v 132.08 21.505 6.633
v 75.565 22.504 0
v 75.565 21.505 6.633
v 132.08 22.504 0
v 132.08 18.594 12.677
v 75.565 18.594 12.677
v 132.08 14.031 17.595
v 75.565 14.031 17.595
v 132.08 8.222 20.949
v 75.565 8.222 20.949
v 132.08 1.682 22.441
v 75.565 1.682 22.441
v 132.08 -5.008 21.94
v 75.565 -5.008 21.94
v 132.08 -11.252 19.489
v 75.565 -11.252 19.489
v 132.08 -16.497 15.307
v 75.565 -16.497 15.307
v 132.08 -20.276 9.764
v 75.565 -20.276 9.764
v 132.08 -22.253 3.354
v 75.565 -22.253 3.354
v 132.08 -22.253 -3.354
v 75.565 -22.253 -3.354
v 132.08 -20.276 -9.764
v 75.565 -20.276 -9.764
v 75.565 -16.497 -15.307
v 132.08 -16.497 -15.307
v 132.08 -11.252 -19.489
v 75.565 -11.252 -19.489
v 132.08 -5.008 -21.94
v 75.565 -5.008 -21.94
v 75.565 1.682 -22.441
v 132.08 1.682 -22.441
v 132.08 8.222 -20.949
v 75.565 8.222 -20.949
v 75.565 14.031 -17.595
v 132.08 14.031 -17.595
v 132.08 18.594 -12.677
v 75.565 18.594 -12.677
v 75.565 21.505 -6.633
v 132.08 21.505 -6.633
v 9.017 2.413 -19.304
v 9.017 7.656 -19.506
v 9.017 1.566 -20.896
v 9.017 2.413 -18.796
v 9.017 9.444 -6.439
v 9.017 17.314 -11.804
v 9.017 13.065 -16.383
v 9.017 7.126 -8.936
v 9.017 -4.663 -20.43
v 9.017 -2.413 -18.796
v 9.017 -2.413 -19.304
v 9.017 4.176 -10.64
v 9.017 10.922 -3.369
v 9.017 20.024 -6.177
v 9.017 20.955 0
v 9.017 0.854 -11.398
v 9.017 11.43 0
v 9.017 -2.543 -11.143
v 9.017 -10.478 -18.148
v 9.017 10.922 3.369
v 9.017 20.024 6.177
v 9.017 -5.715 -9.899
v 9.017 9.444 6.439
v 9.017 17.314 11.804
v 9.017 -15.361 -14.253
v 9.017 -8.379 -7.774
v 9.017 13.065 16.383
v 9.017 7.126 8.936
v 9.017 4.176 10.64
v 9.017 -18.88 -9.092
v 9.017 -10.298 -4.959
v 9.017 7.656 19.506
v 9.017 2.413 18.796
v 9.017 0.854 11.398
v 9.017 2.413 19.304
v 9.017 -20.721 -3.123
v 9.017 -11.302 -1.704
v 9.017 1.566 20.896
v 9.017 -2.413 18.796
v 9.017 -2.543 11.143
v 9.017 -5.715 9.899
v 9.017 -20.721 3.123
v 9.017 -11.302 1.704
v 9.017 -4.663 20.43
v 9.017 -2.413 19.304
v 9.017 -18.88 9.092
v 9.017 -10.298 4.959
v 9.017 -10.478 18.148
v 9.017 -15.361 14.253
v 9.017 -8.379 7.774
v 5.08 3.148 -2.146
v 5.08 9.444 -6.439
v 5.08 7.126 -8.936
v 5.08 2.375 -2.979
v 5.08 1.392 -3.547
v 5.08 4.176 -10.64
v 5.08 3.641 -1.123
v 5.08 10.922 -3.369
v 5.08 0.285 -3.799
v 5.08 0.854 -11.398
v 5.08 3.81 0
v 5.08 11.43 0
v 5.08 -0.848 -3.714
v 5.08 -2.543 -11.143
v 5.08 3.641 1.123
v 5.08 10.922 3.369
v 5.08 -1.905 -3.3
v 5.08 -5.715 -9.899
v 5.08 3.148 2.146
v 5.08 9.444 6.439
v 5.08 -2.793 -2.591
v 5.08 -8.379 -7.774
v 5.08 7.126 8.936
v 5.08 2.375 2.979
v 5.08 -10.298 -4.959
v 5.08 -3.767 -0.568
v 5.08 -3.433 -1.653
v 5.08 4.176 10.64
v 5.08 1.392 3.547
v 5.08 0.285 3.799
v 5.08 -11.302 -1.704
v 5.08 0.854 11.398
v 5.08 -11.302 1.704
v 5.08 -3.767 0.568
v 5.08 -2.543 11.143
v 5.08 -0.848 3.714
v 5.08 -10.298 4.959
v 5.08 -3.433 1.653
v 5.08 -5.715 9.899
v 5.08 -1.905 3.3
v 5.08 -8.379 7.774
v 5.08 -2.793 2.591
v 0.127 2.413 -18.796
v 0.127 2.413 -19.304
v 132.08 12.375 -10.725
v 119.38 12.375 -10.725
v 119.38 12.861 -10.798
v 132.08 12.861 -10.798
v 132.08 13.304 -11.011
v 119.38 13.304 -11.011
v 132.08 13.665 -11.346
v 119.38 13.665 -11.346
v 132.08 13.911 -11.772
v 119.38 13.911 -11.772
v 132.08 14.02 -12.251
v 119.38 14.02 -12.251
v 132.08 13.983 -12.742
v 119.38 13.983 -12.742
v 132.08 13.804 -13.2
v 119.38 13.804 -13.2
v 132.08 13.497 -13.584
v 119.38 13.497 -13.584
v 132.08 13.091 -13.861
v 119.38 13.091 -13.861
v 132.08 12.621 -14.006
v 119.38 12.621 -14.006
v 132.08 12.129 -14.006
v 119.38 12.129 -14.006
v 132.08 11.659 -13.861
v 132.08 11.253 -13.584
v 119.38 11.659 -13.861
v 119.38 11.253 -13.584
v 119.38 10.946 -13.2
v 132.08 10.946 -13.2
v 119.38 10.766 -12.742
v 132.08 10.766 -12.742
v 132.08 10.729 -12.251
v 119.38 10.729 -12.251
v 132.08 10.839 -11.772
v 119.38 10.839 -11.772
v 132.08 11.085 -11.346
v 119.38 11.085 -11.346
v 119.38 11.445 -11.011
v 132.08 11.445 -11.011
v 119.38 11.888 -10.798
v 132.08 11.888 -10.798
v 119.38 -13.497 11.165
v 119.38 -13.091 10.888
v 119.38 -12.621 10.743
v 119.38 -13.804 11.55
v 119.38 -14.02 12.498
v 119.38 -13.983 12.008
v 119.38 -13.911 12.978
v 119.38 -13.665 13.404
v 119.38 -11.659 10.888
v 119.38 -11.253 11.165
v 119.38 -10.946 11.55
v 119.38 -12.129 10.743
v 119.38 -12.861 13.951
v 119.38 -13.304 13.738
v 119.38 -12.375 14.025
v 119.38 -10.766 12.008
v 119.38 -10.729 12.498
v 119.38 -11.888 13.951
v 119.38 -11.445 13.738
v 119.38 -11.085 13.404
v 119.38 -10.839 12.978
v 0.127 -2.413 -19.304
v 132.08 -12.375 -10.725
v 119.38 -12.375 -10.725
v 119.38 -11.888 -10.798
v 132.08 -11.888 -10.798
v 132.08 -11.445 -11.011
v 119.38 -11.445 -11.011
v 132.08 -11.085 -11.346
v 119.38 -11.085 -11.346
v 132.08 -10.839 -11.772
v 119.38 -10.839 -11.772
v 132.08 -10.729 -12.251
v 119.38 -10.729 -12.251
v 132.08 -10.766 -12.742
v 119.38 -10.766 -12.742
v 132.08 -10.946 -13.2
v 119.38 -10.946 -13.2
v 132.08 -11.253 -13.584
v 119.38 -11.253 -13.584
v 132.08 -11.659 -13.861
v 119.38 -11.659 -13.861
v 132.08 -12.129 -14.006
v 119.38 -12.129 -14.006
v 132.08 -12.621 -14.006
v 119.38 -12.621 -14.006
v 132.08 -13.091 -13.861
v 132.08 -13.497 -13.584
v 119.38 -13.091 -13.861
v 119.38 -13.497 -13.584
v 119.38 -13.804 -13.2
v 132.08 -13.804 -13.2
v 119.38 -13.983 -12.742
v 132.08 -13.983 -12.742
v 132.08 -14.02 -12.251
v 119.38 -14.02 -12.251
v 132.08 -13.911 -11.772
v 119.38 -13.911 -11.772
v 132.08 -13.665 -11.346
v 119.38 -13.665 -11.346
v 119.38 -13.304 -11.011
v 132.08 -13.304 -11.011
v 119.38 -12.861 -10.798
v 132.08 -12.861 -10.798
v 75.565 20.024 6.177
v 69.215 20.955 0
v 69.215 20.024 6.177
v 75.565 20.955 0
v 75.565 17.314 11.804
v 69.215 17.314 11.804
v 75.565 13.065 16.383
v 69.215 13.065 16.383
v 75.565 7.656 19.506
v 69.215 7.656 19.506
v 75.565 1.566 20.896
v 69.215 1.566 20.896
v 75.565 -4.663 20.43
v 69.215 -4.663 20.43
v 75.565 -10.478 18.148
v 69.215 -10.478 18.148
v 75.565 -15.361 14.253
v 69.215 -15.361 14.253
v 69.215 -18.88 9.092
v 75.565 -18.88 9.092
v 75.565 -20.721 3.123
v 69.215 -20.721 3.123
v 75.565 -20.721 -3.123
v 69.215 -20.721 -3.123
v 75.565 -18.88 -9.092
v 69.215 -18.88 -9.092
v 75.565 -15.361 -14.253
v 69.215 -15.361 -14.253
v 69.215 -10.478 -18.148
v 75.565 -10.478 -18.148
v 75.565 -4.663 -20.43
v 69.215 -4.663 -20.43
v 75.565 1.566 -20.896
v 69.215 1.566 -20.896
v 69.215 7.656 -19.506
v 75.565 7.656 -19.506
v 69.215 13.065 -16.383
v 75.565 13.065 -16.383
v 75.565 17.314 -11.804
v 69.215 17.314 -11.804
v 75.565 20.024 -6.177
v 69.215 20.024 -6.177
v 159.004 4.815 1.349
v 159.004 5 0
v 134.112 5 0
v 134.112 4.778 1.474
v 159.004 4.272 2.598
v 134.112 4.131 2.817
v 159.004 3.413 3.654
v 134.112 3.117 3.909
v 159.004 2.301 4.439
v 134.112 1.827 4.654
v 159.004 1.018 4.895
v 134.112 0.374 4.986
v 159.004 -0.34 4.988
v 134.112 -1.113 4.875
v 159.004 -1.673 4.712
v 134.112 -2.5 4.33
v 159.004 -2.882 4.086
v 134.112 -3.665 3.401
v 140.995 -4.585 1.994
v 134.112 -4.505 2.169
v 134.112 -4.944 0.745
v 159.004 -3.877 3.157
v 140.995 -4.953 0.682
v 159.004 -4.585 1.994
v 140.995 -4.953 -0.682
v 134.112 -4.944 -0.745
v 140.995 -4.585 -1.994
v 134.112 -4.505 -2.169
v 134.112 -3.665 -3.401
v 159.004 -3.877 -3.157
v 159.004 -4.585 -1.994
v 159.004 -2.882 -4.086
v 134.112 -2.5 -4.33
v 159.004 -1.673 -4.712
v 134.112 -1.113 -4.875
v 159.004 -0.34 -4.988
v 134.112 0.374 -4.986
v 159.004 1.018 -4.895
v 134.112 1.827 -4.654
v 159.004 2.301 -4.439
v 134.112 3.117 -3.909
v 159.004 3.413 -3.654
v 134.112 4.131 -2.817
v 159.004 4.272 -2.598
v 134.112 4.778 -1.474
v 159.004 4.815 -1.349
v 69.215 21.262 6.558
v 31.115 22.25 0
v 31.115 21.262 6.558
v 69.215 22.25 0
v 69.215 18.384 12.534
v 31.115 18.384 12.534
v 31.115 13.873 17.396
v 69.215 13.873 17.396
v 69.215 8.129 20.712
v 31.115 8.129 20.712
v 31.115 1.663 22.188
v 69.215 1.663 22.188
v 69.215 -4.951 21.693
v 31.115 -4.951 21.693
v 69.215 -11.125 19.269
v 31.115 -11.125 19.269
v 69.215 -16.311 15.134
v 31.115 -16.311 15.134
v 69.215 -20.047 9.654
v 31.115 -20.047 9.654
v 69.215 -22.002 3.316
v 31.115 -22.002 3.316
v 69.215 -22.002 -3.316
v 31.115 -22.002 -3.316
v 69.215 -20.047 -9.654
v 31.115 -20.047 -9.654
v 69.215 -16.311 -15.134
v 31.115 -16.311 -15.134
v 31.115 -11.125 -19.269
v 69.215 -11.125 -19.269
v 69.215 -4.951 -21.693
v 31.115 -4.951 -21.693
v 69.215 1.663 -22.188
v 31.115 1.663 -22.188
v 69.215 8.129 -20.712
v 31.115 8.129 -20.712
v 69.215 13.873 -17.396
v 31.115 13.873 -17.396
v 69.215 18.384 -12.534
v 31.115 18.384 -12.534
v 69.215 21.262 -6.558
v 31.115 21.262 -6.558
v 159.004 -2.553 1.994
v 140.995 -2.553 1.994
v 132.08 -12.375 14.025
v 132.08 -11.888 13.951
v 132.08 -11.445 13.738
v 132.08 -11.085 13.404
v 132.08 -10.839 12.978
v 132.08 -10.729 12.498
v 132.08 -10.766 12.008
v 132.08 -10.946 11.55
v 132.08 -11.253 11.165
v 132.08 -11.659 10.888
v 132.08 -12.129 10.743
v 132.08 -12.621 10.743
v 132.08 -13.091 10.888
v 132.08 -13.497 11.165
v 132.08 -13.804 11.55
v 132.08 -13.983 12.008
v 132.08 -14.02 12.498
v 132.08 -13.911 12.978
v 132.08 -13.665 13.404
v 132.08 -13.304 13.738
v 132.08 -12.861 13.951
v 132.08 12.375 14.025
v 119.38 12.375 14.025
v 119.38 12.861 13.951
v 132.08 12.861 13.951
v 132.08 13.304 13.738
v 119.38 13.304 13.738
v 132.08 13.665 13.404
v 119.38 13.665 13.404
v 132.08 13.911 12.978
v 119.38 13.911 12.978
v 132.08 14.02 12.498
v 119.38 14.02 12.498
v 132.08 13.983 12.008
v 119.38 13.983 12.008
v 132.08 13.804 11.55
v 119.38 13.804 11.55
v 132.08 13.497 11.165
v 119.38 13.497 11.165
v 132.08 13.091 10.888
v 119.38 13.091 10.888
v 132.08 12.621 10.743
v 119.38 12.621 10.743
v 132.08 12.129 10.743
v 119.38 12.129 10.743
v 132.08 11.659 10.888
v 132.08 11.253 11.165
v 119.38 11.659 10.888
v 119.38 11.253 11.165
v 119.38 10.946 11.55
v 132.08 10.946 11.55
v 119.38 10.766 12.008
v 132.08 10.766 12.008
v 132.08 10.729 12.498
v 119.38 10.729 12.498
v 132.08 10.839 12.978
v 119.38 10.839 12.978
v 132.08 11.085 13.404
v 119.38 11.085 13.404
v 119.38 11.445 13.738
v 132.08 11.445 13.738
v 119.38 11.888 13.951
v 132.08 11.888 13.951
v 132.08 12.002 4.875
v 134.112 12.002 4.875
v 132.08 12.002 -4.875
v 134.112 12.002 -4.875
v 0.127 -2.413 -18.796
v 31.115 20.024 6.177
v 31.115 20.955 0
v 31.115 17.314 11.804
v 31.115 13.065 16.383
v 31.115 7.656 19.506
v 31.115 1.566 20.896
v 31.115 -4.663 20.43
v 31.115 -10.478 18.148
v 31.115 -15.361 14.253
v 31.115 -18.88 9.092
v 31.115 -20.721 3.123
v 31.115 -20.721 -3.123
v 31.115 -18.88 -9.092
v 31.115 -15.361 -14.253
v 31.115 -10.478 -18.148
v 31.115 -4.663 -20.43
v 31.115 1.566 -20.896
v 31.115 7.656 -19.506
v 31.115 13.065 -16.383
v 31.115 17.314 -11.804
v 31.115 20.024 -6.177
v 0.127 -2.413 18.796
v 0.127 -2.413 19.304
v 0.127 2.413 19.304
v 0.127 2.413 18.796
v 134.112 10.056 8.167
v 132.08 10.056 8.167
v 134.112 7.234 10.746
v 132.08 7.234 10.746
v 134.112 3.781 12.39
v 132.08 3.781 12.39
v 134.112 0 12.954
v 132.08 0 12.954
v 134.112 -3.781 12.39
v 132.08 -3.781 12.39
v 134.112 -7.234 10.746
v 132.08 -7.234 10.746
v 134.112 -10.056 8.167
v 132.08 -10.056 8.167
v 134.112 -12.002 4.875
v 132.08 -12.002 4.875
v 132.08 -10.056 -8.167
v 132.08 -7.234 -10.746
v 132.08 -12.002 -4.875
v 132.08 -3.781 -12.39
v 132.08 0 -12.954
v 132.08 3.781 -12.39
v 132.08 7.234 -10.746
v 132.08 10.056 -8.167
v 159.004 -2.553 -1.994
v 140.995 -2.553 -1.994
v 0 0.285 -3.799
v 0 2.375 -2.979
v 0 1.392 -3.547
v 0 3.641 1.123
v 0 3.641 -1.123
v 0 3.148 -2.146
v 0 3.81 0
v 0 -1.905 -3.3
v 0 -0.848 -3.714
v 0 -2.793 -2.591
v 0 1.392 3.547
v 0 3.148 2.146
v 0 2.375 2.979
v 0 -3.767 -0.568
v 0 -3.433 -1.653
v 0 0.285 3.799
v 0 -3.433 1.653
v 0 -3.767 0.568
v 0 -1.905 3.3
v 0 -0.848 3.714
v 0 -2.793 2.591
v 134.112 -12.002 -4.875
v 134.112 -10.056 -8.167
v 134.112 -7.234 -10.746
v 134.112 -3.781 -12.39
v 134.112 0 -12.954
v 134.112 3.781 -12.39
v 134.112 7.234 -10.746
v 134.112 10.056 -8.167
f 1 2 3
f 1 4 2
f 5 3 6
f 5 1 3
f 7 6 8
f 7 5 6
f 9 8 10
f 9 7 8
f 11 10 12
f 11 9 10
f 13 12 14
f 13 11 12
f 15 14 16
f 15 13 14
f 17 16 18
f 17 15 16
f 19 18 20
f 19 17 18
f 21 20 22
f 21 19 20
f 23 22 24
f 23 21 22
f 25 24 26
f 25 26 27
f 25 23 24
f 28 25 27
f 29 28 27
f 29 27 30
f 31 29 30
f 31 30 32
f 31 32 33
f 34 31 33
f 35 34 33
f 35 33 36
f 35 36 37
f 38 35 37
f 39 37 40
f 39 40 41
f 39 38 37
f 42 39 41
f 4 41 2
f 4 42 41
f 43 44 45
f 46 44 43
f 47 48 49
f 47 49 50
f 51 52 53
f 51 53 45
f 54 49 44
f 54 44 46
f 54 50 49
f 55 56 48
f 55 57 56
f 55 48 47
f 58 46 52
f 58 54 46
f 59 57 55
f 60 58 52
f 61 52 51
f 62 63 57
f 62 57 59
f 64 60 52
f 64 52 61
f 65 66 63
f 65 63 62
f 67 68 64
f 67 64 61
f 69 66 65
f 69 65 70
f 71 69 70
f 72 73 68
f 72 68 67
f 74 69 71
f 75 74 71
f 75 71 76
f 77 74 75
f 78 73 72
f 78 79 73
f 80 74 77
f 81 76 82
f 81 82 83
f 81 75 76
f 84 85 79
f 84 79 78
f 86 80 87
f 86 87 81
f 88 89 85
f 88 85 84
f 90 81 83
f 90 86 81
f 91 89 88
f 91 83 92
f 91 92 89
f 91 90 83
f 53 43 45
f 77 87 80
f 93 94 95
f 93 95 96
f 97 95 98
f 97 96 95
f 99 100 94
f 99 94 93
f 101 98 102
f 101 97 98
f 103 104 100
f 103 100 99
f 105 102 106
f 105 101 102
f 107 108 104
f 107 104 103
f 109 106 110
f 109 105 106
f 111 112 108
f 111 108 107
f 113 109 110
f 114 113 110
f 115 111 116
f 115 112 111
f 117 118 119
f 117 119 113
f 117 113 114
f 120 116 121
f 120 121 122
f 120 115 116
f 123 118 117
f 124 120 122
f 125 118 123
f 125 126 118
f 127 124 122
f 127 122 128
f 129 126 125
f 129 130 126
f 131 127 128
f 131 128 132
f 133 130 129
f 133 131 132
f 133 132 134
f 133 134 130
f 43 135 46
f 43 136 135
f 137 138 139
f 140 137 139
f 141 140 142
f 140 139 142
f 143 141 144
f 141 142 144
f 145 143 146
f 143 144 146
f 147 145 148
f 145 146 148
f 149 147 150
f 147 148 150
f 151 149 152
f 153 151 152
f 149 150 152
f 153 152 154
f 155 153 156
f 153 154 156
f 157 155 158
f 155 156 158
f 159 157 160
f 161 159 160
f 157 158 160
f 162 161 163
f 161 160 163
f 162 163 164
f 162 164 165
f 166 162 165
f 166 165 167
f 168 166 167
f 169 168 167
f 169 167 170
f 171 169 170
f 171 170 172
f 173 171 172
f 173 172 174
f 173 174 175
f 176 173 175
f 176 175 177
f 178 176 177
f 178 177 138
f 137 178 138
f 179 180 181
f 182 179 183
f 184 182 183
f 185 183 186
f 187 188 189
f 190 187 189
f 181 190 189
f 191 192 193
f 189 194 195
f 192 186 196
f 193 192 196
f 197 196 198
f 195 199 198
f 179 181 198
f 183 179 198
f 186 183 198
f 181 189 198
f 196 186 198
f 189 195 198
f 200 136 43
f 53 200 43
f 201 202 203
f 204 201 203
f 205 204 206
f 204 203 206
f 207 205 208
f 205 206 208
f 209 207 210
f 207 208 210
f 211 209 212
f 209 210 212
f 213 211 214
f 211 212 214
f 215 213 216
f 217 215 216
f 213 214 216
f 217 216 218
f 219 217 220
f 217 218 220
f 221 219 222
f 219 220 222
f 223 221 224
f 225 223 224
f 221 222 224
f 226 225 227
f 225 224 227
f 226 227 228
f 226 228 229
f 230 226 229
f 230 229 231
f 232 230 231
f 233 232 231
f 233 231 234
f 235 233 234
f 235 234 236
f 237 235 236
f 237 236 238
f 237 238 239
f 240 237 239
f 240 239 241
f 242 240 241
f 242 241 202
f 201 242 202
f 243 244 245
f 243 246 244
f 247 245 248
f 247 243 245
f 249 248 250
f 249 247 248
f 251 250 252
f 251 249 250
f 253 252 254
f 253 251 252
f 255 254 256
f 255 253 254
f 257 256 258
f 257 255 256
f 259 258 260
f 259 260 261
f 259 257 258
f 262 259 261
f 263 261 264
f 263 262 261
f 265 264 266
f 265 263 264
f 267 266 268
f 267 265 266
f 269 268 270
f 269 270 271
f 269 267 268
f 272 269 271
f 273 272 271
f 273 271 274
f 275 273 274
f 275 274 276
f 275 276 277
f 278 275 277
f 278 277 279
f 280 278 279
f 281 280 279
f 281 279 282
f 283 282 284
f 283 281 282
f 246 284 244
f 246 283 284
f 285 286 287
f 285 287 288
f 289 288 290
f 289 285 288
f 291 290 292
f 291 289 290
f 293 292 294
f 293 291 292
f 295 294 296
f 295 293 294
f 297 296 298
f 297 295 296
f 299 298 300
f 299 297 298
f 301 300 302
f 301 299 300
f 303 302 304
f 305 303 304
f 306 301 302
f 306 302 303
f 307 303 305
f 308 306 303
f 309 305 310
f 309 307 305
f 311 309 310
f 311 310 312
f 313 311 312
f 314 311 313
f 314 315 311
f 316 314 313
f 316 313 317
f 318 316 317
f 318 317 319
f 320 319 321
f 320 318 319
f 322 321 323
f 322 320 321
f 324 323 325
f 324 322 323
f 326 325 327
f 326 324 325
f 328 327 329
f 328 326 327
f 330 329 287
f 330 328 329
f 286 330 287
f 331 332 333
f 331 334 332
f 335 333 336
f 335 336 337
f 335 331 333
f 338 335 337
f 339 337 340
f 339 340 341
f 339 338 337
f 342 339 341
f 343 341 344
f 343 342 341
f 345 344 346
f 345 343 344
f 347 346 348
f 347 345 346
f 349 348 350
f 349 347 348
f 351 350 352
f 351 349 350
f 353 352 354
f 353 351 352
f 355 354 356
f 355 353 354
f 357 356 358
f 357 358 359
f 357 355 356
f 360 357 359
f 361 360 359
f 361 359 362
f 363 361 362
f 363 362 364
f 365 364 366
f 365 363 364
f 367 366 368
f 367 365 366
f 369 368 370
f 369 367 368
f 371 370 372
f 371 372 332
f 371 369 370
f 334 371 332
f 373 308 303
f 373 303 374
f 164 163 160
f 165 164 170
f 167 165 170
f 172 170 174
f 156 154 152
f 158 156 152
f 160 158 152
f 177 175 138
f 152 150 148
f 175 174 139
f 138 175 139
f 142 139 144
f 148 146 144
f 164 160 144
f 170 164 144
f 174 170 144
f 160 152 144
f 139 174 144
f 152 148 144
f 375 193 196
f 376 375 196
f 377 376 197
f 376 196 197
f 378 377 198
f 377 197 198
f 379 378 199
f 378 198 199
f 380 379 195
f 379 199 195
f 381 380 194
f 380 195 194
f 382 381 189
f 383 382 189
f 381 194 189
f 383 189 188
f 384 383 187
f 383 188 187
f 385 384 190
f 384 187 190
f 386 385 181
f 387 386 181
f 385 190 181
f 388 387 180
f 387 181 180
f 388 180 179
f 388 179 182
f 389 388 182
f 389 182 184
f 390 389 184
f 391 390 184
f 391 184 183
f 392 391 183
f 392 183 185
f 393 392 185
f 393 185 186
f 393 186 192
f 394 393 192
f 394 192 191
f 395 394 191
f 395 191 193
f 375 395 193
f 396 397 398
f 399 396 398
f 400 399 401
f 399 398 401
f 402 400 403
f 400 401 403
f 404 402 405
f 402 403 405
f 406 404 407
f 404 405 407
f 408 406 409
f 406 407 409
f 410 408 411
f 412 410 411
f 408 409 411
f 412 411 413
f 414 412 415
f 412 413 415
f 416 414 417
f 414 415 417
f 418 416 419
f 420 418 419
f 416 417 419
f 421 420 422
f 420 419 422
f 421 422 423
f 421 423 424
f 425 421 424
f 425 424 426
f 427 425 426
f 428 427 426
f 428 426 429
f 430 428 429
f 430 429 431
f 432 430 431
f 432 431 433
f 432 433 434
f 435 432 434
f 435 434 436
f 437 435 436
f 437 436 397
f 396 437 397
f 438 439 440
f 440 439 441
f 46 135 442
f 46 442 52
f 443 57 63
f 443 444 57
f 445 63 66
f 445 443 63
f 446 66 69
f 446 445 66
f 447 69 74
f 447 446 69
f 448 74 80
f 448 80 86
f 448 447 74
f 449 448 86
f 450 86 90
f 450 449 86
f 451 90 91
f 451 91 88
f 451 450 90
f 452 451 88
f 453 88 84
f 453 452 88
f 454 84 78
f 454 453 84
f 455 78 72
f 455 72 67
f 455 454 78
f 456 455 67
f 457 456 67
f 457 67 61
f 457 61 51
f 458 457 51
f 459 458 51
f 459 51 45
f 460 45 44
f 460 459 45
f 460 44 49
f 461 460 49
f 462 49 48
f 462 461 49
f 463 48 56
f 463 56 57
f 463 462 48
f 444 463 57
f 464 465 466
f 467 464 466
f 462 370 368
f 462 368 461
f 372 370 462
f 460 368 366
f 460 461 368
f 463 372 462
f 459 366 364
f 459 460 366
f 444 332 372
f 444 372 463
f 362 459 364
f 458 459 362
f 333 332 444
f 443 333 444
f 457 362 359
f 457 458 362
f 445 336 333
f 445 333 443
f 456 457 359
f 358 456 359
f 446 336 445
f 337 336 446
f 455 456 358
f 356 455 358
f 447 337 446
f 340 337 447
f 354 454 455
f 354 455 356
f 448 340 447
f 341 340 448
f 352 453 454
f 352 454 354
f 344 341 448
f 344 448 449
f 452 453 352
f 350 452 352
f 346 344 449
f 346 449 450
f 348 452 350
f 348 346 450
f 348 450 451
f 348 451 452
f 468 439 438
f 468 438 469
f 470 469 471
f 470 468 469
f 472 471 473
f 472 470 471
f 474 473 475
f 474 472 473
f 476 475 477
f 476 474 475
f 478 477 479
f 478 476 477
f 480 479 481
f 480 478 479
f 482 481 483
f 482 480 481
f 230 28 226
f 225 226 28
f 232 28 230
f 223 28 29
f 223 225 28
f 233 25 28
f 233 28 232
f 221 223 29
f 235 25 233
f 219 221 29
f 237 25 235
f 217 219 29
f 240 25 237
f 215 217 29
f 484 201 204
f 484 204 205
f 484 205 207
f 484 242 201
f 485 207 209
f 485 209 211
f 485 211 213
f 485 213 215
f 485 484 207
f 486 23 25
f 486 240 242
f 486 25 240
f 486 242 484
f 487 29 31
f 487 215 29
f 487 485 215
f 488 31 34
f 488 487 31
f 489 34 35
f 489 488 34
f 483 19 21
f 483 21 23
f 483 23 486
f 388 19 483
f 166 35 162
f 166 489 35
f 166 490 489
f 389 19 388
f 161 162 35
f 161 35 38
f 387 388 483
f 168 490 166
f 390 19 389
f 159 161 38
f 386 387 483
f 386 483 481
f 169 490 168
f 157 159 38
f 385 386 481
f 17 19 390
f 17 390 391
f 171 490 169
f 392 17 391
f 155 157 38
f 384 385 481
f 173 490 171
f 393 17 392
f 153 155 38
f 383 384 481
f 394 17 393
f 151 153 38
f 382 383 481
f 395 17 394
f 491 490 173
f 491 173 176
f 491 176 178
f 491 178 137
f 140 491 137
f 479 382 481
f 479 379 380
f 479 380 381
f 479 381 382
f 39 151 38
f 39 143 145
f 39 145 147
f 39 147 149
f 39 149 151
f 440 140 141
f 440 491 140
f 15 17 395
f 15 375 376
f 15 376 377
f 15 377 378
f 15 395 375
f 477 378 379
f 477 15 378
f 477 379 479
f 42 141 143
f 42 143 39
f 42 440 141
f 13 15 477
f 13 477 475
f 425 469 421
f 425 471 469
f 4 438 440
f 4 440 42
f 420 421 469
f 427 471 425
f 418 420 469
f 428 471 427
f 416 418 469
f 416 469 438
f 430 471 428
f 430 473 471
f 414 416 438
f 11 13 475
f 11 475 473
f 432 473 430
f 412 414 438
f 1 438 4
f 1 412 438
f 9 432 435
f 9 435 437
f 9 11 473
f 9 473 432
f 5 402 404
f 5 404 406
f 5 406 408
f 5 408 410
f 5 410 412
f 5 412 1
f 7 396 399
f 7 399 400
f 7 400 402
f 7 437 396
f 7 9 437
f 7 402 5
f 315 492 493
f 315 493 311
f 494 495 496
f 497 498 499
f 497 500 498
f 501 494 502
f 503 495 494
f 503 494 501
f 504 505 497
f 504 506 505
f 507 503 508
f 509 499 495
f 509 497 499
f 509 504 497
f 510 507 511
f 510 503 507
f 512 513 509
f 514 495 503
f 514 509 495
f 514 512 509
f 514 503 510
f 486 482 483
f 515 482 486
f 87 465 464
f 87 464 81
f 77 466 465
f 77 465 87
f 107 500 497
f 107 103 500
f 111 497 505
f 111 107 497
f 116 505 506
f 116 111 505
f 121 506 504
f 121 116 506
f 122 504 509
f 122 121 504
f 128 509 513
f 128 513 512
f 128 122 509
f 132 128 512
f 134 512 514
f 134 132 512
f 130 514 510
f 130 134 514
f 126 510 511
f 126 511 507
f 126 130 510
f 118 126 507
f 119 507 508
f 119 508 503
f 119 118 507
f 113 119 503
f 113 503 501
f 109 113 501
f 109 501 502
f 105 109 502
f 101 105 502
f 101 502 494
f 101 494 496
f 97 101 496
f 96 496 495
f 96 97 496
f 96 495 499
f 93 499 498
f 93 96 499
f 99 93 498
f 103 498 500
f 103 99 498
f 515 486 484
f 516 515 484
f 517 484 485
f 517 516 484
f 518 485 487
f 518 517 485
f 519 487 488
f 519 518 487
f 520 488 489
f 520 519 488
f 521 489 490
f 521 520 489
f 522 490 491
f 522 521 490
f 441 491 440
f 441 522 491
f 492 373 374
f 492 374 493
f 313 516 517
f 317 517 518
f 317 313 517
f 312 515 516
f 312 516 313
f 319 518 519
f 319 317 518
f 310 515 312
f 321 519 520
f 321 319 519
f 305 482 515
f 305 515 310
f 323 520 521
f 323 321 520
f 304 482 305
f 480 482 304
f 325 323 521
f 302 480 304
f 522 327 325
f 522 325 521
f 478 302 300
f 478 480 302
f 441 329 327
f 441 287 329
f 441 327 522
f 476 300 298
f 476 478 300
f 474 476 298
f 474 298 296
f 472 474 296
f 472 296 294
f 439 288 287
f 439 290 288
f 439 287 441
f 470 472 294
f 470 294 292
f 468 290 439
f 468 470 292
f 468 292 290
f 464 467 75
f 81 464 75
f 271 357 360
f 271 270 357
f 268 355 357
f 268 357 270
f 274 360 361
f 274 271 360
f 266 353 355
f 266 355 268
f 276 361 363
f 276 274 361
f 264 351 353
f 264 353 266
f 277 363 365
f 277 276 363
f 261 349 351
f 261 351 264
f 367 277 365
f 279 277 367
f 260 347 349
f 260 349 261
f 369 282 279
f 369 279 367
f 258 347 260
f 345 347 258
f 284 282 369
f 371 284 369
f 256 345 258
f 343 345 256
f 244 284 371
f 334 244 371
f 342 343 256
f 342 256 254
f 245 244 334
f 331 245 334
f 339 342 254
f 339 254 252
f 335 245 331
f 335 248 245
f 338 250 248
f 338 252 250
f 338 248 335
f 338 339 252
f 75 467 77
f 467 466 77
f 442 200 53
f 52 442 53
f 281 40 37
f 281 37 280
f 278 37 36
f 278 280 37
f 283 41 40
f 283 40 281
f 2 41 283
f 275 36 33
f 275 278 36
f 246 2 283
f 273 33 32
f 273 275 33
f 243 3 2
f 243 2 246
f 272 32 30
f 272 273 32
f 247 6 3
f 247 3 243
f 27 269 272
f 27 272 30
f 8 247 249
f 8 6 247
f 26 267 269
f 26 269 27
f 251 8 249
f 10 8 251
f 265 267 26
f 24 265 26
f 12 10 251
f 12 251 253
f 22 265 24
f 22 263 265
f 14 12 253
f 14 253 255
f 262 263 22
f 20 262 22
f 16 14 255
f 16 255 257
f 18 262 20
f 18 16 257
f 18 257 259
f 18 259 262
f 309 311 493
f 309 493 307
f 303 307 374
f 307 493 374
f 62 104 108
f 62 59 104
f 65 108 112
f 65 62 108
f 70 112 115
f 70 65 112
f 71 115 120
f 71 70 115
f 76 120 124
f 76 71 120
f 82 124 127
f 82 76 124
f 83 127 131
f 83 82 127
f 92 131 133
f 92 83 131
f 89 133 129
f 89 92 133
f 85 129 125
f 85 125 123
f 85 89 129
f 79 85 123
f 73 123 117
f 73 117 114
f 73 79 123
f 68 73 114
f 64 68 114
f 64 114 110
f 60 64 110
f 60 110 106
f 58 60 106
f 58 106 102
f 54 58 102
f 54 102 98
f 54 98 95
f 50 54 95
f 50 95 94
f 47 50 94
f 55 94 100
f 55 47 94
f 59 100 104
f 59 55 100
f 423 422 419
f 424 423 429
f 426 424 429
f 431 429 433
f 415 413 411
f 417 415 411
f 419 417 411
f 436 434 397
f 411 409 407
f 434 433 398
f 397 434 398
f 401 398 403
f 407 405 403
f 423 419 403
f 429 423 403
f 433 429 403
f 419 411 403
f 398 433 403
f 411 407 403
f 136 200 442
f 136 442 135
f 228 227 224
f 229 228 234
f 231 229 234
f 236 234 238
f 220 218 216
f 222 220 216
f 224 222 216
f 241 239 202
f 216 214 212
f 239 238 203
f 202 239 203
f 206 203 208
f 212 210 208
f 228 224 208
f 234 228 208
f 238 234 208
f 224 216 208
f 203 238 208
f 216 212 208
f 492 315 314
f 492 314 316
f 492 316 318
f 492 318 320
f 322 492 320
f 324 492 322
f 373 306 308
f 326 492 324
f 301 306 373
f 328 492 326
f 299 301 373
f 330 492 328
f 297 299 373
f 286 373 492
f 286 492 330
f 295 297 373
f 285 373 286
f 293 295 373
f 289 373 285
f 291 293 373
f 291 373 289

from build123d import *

# Parameters (mm, degrees)
CUT_EXTRUDE1_DEPTH              = 18.0086
CUT_EXTRUDE2_DEPTH              = 2.032
TAP_DRILL_FOR_M4X0_7_TAP2_D     = 3.3
TAP_DRILL_FOR_M4X0_7_TAP2_DEPTH = 12.7
SKETCH8_W                       = 8.89
SKETCH8_H                       = 4.826
BOSS_EXTRUDE1_DEPTH             = 0.254


with BuildPart() as part:
    # Sketch1 → Revolve1 (revolve)
    with BuildSketch(Plane.XY):
        Polygon((0, 0), (0, 3.81), (5.08, 3.81), (5.08, 11.43), (9.017, 11.43), (9.017, 20.955), (31.115, 20.955), (31.115, 22.2504), (69.215, 22.2504), (69.215, 20.955), (75.565, 20.955), (75.565, 22.5044), (132.08, 22.5044), (132.08, 12.954), (134.112, 12.954), (134.112, 4.99999), (159.004, 4.99999), (159.004, 0), align=None)
    revolve(axis=Axis((0, 0, 0), (1, 0, 0)))

    # Sketch2 → Cut-Extrude1 (cut)
    with BuildSketch(Plane(origin=(159.004, 0, 0), x_dir=(0, 0, -1), z_dir=(1, 0, 0))):
        with BuildLine():
            Line((-1.9939, -4.585222218), (-1.9939, -2.553222218))
            Line((-1.9939, -2.553222218), (1.9939, -2.553222218))
            Line((1.9939, -2.553222218), (1.9939, -4.585222218))
            ThreePointArc((1.9939, -4.585222218), (0, -4.99999), (-1.9939, -4.585222218))
        make_face()
    extrude(amount=-CUT_EXTRUDE1_DEPTH, mode=Mode.SUBTRACT)

    # Sketch3 → Cut-Extrude2 (cut)
    with BuildSketch(Plane(origin=(134.112, 0, 0), x_dir=(0, 0, -1), z_dir=(1, 0, 0))):
        with BuildLine():
            Line((-4.875460363, 12.0015), (4.875460363, 12.0015))
            ThreePointArc((4.875460363, 12.0015), (0, 12.954), (-4.875460363, 12.0015))
        make_face()
        with BuildLine():
            Line((-4.875460363, -12.0015), (4.875460363, -12.0015))
            ThreePointArc((4.875460363, -12.0015), (0, -12.954), (-4.875460363, -12.0015))
        make_face()
    extrude(amount=-CUT_EXTRUDE2_DEPTH, mode=Mode.SUBTRACT)

    # Tap Drill for M4x0.7 Tap2
    with Locations(Plane(origin=(132.08, 0, 0), x_dir=(0, 0, -1), z_dir=(1, 0, 0))):
        with Locations((-12.374792935, 12.374792935), (12.374792935, -12.374792935), (12.374792935, 12.374792935), (-12.374792935, -12.374792935)):
            Hole(TAP_DRILL_FOR_M4X0_7_TAP2_D / 2, depth=TAP_DRILL_FOR_M4X0_7_TAP2_DEPTH)

    # Sketch8 → Boss-Extrude1 (add, symmetric)
    with BuildSketch(Plane.XY.offset(19.05)):
        with Locations((4.572, 0)):
            Rectangle(SKETCH8_W, SKETCH8_H)
    boss_extrude1 = extrude(amount=BOSS_EXTRUDE1_DEPTH, both=True)

    # Mirror1: Boss-Extrude1 across plane
    add(boss_extrude1.mirror(Plane.XY))


solid = part.part
